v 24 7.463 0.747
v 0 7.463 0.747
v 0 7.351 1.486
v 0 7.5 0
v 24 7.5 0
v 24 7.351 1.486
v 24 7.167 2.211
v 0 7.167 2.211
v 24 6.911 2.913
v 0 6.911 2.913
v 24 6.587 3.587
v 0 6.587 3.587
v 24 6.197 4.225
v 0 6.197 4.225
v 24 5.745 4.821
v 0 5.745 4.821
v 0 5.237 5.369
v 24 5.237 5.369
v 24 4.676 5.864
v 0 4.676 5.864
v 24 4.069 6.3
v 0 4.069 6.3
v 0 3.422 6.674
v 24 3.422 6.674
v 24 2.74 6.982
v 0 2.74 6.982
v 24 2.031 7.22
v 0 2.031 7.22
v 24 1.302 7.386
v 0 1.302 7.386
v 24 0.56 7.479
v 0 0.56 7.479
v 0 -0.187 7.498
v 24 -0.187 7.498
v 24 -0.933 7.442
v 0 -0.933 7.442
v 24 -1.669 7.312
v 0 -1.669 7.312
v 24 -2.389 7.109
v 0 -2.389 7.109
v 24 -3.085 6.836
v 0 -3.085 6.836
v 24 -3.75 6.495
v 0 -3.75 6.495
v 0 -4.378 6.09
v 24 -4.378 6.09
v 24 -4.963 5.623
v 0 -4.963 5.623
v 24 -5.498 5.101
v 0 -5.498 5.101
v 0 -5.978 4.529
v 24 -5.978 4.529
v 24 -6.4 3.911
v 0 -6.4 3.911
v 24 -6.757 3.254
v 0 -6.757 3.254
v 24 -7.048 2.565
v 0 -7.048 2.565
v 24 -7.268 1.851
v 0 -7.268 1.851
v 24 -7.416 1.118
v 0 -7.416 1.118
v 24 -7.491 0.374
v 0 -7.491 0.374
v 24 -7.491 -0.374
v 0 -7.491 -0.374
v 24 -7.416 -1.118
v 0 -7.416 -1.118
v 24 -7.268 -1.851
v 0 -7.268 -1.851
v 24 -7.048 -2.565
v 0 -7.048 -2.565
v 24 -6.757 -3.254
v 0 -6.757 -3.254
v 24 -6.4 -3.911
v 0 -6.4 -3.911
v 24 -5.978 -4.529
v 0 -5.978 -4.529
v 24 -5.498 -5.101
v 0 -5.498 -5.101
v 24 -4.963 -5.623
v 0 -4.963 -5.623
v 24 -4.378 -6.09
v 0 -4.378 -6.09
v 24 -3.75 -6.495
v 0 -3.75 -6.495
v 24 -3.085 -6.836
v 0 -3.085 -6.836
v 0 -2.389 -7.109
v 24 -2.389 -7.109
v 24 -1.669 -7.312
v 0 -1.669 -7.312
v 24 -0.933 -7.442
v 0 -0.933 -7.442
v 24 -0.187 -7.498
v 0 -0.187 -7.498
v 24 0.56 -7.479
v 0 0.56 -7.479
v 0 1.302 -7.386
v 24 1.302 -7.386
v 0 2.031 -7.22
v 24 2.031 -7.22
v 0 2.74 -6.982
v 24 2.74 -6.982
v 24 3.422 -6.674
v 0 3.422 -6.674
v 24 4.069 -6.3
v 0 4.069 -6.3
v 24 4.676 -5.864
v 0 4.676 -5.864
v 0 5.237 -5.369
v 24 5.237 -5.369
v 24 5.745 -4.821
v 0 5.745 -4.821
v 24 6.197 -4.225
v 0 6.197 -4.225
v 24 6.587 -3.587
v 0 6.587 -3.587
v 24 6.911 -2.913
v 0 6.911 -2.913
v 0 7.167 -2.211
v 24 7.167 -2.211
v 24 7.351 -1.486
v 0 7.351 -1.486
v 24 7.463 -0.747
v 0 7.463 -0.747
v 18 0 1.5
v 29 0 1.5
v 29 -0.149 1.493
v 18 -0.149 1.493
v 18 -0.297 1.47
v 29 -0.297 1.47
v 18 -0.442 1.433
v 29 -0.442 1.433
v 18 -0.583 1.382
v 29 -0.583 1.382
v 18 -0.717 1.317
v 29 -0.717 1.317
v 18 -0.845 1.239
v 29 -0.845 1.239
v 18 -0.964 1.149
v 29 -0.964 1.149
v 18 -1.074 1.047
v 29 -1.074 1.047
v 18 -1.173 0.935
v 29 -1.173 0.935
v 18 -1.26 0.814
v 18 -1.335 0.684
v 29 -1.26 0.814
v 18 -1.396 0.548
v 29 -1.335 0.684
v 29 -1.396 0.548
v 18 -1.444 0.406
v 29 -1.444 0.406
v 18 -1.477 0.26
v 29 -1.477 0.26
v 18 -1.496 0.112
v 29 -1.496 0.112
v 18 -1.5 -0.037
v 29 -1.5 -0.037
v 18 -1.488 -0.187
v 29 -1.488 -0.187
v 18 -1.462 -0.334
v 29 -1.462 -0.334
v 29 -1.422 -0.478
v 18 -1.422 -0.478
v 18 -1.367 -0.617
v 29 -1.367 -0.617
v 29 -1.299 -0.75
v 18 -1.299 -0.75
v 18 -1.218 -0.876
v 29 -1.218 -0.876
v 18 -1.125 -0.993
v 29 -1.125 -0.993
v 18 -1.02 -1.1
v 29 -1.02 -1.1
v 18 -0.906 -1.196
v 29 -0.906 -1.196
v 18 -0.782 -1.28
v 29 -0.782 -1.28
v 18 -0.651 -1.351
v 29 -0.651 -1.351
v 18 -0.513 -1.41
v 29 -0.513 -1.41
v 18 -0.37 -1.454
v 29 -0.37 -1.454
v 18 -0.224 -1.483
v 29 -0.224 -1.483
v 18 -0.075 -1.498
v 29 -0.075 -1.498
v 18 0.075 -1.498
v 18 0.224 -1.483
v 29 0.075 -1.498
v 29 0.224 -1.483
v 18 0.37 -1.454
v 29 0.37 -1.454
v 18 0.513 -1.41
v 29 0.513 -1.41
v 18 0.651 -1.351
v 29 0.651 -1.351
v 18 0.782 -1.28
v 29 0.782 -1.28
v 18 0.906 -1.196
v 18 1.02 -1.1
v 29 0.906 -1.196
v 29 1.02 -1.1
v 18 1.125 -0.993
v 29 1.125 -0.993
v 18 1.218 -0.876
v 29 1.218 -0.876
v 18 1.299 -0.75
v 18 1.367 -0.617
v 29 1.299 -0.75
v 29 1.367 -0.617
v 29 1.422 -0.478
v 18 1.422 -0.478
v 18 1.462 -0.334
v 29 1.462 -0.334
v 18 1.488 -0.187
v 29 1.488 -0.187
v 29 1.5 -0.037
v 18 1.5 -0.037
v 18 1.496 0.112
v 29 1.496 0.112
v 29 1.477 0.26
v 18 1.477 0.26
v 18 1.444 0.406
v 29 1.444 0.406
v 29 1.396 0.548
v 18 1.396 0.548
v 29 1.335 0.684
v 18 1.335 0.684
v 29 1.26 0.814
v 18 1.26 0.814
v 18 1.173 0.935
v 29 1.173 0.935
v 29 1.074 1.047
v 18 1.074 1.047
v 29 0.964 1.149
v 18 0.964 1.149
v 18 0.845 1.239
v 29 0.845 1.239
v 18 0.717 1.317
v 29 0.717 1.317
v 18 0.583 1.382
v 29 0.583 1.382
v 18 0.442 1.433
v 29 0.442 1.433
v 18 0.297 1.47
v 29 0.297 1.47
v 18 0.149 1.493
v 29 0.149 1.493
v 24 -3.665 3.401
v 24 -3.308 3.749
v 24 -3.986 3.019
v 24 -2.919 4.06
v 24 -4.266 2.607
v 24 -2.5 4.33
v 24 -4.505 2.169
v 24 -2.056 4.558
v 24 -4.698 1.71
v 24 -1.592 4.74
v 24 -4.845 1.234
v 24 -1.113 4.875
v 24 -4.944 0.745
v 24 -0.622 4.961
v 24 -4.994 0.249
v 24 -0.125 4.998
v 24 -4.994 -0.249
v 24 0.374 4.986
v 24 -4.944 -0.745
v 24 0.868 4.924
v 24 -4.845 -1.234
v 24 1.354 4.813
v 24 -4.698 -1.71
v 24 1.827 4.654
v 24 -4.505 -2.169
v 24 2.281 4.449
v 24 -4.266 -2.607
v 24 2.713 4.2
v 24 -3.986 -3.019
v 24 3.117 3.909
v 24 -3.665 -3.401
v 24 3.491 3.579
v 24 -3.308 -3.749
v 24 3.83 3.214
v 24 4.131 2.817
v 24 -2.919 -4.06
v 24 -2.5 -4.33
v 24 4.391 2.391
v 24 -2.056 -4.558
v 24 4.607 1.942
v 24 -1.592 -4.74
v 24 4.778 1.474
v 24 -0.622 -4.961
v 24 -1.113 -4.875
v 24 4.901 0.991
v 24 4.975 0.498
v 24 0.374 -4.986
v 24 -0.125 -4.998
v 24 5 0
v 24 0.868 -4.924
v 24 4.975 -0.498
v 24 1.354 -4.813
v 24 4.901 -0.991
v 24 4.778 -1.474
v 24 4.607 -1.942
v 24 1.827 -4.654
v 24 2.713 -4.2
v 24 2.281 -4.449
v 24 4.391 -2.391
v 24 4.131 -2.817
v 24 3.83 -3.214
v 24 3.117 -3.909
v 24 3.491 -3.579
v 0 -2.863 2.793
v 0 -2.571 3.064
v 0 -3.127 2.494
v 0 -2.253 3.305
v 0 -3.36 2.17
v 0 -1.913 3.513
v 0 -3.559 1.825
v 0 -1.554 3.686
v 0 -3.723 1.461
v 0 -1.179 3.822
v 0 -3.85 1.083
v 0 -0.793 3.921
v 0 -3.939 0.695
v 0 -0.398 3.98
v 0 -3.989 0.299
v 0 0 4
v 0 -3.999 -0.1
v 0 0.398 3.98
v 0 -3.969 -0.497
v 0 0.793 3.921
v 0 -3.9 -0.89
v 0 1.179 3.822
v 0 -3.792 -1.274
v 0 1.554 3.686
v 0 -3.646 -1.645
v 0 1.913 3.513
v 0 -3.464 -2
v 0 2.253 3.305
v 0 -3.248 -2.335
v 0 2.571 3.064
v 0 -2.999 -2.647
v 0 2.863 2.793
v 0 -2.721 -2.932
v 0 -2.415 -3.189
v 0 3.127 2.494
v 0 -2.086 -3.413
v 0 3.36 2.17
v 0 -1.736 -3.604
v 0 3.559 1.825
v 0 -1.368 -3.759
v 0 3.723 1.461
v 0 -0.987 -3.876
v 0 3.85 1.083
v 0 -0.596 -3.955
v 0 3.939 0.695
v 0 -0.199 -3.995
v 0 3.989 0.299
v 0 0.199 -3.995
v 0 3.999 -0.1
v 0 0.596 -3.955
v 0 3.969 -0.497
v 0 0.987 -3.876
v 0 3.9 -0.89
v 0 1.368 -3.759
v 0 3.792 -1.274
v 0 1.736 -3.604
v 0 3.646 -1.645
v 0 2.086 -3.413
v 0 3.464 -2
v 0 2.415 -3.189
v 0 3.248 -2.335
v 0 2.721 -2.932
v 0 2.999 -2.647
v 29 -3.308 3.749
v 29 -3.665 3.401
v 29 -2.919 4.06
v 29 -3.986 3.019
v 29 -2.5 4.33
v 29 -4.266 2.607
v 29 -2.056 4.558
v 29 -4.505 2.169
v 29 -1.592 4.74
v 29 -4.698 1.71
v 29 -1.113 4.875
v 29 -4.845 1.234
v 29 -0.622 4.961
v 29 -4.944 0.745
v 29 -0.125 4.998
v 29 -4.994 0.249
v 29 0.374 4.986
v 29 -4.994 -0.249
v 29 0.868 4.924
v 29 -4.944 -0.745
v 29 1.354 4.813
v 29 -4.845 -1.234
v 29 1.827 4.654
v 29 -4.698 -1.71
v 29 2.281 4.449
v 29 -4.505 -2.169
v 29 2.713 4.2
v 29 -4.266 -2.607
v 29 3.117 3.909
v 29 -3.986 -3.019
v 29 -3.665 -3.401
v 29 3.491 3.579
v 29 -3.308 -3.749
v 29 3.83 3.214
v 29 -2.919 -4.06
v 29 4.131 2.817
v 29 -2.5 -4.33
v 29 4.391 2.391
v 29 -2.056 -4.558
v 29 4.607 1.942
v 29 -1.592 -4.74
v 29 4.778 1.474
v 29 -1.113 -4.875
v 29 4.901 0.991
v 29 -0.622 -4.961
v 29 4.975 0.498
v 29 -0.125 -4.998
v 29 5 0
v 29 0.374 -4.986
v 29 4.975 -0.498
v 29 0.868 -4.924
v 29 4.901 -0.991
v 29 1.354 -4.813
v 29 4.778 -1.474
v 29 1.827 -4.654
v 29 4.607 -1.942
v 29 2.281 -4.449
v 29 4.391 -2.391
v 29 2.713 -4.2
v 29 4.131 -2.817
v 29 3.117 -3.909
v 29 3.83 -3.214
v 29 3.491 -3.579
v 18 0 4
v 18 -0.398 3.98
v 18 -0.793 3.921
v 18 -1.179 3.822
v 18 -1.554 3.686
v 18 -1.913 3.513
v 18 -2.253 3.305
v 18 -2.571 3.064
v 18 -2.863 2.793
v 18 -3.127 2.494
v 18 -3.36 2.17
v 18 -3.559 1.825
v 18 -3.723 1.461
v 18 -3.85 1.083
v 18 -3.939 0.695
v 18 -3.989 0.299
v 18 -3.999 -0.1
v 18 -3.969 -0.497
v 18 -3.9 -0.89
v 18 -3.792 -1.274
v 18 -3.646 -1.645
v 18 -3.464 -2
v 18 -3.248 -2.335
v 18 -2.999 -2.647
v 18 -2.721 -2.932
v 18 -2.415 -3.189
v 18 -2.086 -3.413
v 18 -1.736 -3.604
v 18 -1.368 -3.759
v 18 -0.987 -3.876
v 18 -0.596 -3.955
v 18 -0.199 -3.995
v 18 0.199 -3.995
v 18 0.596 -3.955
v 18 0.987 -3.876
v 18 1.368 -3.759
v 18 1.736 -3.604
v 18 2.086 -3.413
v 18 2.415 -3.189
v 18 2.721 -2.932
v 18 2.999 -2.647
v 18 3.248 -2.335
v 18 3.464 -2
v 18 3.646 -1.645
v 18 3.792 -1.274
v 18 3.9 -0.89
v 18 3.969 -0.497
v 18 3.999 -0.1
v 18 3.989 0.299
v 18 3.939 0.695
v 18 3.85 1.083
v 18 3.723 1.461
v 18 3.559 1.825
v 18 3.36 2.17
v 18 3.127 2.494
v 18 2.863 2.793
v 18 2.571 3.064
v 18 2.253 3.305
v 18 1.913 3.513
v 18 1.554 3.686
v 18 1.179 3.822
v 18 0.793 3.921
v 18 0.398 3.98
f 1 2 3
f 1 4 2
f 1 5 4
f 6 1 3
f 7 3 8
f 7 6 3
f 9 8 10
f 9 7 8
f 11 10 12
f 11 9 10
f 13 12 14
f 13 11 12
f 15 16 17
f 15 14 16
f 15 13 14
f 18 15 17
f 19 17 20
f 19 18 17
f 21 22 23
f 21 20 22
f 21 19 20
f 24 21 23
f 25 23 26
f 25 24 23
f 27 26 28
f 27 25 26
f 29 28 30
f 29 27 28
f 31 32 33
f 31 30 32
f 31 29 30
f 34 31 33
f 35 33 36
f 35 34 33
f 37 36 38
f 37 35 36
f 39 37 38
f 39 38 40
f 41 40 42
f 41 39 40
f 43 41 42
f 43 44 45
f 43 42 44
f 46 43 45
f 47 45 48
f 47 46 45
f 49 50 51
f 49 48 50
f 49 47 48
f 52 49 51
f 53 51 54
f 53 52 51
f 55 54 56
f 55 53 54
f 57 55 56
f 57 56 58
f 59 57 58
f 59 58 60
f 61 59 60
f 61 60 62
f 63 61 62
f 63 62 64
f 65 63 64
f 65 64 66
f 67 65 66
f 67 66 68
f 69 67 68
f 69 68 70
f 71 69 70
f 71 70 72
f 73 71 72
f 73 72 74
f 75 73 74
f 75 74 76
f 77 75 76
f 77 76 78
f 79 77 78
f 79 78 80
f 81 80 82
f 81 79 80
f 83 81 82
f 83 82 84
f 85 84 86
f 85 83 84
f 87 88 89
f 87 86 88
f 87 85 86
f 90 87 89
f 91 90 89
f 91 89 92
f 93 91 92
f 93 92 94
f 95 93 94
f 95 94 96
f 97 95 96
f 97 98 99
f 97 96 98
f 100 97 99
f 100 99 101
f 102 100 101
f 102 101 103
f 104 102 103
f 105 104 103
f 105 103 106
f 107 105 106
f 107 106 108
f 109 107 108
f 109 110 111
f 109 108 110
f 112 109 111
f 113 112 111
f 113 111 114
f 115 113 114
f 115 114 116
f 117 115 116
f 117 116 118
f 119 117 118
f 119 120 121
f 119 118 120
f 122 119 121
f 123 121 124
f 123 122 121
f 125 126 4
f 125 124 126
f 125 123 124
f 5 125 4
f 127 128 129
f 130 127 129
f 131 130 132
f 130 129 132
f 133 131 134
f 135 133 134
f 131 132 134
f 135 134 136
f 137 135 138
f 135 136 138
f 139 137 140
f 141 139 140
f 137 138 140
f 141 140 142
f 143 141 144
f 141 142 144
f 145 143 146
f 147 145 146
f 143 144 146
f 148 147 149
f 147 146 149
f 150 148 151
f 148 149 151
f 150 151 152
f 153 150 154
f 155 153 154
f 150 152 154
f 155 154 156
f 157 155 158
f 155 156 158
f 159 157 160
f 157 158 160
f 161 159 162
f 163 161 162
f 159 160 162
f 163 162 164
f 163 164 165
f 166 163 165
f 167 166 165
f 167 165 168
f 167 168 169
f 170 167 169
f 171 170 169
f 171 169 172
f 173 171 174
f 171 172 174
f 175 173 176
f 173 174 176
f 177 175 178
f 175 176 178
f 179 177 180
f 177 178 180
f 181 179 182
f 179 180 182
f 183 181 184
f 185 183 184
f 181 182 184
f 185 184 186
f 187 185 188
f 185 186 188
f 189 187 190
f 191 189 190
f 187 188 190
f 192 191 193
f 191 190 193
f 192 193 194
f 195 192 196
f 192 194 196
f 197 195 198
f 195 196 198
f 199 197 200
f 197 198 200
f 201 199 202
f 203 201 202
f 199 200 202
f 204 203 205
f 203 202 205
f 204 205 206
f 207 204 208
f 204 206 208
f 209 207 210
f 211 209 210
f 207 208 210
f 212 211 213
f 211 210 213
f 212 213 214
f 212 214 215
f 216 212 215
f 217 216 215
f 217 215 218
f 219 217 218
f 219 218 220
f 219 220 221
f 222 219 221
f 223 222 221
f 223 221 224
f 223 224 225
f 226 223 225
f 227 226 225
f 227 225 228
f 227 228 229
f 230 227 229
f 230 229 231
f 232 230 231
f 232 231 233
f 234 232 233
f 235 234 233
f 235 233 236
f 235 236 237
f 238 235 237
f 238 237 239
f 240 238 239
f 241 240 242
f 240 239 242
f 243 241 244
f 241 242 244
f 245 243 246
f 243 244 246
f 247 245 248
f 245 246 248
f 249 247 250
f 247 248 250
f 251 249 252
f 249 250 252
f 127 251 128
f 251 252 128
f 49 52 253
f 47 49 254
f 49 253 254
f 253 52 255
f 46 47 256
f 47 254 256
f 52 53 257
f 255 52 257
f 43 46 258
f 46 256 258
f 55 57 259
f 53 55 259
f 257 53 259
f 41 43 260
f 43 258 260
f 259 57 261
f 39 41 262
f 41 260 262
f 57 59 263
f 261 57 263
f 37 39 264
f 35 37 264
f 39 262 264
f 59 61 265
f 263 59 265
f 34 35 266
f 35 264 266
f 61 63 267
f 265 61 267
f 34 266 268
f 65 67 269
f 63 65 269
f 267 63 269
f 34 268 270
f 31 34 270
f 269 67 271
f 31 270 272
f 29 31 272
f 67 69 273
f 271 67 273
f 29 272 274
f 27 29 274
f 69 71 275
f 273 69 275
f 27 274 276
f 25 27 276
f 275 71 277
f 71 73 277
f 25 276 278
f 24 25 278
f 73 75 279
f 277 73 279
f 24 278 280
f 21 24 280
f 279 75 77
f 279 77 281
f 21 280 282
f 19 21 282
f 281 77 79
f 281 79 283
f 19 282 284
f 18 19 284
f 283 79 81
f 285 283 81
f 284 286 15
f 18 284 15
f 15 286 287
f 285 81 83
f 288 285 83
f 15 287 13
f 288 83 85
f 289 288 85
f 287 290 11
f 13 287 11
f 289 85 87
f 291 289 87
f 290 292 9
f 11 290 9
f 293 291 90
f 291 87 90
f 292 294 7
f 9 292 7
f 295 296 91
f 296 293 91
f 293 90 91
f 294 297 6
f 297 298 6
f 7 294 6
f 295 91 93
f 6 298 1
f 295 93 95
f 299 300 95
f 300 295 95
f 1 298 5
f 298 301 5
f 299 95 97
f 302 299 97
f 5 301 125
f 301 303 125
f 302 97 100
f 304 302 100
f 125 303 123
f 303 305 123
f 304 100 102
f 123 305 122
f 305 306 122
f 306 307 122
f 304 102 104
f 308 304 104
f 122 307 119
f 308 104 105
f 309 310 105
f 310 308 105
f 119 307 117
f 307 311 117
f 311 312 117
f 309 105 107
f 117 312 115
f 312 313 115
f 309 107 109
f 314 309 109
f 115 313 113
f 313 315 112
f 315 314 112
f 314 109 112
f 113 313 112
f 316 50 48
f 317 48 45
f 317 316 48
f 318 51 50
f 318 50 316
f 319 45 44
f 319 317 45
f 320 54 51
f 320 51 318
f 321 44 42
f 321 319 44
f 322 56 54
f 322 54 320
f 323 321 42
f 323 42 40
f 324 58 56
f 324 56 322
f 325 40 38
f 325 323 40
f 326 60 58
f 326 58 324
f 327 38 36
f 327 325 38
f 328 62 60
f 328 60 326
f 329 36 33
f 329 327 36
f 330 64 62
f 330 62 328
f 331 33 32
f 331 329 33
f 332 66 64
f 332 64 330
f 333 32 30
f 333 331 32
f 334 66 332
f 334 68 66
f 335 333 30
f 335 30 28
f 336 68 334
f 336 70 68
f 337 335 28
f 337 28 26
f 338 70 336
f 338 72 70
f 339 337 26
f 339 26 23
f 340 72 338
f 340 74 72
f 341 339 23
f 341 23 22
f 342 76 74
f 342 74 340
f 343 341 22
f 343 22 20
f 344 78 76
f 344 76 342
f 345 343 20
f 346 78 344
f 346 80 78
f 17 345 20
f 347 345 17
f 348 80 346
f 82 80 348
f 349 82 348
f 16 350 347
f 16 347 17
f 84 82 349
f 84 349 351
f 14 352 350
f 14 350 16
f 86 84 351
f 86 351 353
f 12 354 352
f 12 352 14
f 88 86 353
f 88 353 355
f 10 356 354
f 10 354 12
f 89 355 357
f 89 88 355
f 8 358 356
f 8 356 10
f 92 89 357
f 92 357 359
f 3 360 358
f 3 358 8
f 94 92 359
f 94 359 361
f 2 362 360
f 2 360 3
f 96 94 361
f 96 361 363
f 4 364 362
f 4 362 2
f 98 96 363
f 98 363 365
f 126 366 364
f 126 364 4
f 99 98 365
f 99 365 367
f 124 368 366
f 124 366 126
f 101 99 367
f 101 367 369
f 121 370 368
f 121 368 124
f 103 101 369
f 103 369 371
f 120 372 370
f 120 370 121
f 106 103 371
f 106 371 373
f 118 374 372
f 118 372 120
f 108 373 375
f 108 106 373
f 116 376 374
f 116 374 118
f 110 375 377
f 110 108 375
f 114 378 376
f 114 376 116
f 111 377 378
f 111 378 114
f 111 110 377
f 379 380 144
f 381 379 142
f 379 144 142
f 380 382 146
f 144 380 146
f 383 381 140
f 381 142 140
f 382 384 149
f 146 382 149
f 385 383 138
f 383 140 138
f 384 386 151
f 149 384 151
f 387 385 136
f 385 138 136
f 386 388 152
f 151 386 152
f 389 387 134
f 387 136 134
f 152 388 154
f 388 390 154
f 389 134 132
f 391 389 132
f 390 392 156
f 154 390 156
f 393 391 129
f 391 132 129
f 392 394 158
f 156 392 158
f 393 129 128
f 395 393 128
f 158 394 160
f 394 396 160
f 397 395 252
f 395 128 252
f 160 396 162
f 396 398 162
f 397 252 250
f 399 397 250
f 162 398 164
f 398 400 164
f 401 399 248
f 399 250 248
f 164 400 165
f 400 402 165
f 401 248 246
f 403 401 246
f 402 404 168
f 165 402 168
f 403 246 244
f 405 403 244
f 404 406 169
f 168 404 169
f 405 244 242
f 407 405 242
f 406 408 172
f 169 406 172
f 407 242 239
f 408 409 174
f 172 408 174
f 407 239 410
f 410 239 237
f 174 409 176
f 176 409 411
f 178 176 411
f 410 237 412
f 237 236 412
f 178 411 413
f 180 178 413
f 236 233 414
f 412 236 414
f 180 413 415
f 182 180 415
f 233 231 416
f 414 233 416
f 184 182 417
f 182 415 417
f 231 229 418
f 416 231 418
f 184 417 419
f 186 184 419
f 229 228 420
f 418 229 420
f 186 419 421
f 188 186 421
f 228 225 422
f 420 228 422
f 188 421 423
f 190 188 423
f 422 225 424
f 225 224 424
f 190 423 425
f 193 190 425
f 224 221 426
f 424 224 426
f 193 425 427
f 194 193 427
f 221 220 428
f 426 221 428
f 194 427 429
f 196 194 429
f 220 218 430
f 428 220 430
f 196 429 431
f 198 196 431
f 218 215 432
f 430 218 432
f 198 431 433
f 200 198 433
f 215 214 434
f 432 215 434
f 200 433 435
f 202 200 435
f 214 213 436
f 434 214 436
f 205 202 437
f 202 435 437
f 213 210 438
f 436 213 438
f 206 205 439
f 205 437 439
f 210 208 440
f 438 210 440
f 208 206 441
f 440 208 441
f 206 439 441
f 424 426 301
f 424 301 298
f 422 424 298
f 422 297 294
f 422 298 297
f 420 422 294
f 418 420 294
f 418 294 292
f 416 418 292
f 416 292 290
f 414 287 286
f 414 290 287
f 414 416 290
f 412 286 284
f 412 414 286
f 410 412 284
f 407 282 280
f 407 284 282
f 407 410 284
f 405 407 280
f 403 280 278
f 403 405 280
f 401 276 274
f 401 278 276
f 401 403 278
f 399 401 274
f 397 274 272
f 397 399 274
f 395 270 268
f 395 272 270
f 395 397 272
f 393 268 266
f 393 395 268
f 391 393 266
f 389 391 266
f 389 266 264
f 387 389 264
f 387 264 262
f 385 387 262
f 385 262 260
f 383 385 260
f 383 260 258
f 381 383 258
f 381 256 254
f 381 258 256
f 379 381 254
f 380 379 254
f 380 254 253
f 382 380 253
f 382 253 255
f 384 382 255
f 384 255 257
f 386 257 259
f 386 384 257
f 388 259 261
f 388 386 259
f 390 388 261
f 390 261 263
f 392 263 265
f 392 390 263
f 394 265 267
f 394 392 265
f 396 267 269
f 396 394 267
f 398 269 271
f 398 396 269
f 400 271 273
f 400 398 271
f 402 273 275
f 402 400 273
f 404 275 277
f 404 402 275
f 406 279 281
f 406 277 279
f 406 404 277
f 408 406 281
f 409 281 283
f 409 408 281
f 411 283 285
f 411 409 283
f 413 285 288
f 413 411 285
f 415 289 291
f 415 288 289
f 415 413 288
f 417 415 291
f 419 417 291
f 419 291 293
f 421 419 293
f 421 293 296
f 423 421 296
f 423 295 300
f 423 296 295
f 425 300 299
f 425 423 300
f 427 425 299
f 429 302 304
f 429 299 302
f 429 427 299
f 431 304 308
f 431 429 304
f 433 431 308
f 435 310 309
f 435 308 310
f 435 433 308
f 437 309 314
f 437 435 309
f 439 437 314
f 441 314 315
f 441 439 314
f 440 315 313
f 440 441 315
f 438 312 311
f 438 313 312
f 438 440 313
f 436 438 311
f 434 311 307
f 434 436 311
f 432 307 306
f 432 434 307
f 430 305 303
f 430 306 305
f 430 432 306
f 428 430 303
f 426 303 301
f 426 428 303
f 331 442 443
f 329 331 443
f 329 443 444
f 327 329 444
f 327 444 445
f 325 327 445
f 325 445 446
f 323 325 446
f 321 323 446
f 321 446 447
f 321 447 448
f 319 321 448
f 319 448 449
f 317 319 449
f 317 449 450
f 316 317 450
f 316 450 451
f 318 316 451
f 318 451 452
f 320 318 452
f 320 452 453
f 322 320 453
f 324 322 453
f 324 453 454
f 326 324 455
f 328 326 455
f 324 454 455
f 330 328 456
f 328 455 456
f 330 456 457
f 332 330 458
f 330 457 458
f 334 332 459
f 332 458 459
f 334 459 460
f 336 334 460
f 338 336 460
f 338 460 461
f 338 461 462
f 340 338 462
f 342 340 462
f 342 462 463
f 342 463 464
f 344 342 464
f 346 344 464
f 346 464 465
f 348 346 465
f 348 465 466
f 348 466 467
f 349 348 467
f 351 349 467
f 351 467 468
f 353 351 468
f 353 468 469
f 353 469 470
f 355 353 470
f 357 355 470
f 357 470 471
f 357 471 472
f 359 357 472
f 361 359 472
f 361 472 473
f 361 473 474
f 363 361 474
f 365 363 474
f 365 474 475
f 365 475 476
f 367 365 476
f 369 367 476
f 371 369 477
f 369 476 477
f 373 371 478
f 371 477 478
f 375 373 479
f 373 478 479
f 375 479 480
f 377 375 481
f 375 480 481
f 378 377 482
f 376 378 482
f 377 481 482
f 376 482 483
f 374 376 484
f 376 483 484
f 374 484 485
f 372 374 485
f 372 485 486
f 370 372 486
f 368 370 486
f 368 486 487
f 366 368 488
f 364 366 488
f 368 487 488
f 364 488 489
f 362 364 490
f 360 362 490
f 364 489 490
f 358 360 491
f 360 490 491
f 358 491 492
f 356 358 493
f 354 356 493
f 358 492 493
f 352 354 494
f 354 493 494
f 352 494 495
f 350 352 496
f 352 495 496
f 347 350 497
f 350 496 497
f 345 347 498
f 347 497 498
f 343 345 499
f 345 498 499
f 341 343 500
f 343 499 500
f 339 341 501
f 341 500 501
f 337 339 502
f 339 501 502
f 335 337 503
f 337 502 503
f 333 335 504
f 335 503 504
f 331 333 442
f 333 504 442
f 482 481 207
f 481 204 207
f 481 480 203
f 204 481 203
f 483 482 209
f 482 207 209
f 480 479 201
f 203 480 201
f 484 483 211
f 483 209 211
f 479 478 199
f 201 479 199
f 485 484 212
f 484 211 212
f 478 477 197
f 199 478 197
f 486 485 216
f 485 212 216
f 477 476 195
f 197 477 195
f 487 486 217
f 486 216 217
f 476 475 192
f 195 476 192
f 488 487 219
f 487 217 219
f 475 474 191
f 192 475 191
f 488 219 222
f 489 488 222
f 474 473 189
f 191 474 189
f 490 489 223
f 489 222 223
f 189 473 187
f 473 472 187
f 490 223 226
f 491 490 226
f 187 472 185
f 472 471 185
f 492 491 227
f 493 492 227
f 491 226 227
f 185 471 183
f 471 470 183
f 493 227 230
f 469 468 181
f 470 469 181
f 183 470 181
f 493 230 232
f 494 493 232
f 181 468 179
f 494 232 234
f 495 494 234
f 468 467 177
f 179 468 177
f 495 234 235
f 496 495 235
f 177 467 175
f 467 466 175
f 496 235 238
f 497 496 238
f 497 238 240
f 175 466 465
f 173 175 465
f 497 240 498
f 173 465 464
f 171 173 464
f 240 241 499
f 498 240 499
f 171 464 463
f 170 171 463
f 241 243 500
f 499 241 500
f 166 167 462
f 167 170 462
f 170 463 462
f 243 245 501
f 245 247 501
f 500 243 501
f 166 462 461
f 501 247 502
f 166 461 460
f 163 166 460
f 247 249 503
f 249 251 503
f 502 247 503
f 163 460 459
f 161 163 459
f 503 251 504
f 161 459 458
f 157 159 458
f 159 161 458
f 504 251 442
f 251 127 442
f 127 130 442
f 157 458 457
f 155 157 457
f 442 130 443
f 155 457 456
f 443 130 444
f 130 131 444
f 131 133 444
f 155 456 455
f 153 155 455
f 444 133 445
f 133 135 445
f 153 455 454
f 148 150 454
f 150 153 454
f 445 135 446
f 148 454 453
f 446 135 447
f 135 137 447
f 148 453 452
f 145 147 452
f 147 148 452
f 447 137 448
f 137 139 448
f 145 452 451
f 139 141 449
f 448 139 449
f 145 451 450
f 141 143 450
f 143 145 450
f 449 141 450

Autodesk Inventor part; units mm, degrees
ref_plane "YZ Plane" through (0, 0, 0) normal (1, 0, 0) x (0, 1, 0)
ref_plane "XZ Plane" through (0, 0, 0) normal (0, 1, 0) x (-1, 0, 0)
ref_plane "XY Plane" through (0, 0, 0) normal (0, 0, 1) x (1, 0, 0)
sketch "Sketch1" plane through (0, 0, 0) normal (0, 0, 1) x (1, 0, 0)
  line L0 (0, 0) -> (0, 7.5)
  line L1 (0, 7.5) -> (24, 7.5)
  line L2 (24, 7.5) -> (24, 5)
  line L3 (24, 5) -> (29, 5)
  line L4 (29, 5) -> (29, 0)
  line L5 (29, 0) -> (0, 0)
  dimension "d0" = 24
  dimension "d1" = 5
  dimension "d2" = 15
  dimension "d3" = 10
revolve "Revolution1" add sketch "Sketch1" angle 360 about axis through (29, 0, 0) along (-1, 0, 0)
sketch "Sketch2" plane through (0, 0, 0) normal (-1, 0, 0) x (0, 0, 1)
  circle A0 centre (0, 0) radius 7.5 projected
  point P0 (0, 0)
hole "Hole1" at (0, 0, 0) direction (1, 0, 0) diameter 3 depth 29 counterbore diameter 8 counterbore depth 18
thread "Thread1" size "M8x1.25" class "6H" standard "ISO Metric profile" full length
properties part number "1 part 18"
